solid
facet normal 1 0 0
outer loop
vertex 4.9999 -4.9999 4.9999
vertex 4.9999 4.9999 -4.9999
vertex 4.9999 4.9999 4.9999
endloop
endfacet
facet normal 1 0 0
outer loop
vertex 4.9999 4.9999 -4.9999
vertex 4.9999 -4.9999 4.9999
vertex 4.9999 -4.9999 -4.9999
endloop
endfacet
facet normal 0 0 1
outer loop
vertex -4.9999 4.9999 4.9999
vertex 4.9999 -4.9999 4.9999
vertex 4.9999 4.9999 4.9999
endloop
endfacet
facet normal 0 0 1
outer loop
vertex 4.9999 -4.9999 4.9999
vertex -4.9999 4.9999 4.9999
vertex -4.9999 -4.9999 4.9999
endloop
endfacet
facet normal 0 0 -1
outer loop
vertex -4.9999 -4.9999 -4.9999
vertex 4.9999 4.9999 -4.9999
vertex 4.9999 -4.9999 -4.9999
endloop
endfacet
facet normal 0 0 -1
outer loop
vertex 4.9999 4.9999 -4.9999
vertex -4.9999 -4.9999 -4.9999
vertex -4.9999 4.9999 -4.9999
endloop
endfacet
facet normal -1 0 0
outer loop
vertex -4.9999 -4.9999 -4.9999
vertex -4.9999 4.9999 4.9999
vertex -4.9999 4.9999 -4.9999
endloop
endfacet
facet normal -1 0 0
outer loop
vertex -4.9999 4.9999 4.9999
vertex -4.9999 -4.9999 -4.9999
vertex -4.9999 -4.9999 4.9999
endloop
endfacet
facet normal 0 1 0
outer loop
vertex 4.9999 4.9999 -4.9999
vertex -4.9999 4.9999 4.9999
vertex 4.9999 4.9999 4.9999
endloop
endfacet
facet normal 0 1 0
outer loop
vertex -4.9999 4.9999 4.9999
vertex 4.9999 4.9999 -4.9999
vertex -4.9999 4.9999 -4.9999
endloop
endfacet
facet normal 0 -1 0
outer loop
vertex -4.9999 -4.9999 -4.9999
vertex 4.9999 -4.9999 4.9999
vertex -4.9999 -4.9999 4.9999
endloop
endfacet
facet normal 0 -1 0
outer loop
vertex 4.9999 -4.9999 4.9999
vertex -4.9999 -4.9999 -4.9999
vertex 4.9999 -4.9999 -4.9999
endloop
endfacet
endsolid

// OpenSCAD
intersection() {
  cube(size = [11.9999, 11.9999, 11.9999], center = true);

  union() {
    union() {
      cube(size = [9.9999, 9.9999, 9.9999], center = true);
    
      cube(size = [9.9999, 9.9999, 9.9999], center = true);
    }
  }
}
